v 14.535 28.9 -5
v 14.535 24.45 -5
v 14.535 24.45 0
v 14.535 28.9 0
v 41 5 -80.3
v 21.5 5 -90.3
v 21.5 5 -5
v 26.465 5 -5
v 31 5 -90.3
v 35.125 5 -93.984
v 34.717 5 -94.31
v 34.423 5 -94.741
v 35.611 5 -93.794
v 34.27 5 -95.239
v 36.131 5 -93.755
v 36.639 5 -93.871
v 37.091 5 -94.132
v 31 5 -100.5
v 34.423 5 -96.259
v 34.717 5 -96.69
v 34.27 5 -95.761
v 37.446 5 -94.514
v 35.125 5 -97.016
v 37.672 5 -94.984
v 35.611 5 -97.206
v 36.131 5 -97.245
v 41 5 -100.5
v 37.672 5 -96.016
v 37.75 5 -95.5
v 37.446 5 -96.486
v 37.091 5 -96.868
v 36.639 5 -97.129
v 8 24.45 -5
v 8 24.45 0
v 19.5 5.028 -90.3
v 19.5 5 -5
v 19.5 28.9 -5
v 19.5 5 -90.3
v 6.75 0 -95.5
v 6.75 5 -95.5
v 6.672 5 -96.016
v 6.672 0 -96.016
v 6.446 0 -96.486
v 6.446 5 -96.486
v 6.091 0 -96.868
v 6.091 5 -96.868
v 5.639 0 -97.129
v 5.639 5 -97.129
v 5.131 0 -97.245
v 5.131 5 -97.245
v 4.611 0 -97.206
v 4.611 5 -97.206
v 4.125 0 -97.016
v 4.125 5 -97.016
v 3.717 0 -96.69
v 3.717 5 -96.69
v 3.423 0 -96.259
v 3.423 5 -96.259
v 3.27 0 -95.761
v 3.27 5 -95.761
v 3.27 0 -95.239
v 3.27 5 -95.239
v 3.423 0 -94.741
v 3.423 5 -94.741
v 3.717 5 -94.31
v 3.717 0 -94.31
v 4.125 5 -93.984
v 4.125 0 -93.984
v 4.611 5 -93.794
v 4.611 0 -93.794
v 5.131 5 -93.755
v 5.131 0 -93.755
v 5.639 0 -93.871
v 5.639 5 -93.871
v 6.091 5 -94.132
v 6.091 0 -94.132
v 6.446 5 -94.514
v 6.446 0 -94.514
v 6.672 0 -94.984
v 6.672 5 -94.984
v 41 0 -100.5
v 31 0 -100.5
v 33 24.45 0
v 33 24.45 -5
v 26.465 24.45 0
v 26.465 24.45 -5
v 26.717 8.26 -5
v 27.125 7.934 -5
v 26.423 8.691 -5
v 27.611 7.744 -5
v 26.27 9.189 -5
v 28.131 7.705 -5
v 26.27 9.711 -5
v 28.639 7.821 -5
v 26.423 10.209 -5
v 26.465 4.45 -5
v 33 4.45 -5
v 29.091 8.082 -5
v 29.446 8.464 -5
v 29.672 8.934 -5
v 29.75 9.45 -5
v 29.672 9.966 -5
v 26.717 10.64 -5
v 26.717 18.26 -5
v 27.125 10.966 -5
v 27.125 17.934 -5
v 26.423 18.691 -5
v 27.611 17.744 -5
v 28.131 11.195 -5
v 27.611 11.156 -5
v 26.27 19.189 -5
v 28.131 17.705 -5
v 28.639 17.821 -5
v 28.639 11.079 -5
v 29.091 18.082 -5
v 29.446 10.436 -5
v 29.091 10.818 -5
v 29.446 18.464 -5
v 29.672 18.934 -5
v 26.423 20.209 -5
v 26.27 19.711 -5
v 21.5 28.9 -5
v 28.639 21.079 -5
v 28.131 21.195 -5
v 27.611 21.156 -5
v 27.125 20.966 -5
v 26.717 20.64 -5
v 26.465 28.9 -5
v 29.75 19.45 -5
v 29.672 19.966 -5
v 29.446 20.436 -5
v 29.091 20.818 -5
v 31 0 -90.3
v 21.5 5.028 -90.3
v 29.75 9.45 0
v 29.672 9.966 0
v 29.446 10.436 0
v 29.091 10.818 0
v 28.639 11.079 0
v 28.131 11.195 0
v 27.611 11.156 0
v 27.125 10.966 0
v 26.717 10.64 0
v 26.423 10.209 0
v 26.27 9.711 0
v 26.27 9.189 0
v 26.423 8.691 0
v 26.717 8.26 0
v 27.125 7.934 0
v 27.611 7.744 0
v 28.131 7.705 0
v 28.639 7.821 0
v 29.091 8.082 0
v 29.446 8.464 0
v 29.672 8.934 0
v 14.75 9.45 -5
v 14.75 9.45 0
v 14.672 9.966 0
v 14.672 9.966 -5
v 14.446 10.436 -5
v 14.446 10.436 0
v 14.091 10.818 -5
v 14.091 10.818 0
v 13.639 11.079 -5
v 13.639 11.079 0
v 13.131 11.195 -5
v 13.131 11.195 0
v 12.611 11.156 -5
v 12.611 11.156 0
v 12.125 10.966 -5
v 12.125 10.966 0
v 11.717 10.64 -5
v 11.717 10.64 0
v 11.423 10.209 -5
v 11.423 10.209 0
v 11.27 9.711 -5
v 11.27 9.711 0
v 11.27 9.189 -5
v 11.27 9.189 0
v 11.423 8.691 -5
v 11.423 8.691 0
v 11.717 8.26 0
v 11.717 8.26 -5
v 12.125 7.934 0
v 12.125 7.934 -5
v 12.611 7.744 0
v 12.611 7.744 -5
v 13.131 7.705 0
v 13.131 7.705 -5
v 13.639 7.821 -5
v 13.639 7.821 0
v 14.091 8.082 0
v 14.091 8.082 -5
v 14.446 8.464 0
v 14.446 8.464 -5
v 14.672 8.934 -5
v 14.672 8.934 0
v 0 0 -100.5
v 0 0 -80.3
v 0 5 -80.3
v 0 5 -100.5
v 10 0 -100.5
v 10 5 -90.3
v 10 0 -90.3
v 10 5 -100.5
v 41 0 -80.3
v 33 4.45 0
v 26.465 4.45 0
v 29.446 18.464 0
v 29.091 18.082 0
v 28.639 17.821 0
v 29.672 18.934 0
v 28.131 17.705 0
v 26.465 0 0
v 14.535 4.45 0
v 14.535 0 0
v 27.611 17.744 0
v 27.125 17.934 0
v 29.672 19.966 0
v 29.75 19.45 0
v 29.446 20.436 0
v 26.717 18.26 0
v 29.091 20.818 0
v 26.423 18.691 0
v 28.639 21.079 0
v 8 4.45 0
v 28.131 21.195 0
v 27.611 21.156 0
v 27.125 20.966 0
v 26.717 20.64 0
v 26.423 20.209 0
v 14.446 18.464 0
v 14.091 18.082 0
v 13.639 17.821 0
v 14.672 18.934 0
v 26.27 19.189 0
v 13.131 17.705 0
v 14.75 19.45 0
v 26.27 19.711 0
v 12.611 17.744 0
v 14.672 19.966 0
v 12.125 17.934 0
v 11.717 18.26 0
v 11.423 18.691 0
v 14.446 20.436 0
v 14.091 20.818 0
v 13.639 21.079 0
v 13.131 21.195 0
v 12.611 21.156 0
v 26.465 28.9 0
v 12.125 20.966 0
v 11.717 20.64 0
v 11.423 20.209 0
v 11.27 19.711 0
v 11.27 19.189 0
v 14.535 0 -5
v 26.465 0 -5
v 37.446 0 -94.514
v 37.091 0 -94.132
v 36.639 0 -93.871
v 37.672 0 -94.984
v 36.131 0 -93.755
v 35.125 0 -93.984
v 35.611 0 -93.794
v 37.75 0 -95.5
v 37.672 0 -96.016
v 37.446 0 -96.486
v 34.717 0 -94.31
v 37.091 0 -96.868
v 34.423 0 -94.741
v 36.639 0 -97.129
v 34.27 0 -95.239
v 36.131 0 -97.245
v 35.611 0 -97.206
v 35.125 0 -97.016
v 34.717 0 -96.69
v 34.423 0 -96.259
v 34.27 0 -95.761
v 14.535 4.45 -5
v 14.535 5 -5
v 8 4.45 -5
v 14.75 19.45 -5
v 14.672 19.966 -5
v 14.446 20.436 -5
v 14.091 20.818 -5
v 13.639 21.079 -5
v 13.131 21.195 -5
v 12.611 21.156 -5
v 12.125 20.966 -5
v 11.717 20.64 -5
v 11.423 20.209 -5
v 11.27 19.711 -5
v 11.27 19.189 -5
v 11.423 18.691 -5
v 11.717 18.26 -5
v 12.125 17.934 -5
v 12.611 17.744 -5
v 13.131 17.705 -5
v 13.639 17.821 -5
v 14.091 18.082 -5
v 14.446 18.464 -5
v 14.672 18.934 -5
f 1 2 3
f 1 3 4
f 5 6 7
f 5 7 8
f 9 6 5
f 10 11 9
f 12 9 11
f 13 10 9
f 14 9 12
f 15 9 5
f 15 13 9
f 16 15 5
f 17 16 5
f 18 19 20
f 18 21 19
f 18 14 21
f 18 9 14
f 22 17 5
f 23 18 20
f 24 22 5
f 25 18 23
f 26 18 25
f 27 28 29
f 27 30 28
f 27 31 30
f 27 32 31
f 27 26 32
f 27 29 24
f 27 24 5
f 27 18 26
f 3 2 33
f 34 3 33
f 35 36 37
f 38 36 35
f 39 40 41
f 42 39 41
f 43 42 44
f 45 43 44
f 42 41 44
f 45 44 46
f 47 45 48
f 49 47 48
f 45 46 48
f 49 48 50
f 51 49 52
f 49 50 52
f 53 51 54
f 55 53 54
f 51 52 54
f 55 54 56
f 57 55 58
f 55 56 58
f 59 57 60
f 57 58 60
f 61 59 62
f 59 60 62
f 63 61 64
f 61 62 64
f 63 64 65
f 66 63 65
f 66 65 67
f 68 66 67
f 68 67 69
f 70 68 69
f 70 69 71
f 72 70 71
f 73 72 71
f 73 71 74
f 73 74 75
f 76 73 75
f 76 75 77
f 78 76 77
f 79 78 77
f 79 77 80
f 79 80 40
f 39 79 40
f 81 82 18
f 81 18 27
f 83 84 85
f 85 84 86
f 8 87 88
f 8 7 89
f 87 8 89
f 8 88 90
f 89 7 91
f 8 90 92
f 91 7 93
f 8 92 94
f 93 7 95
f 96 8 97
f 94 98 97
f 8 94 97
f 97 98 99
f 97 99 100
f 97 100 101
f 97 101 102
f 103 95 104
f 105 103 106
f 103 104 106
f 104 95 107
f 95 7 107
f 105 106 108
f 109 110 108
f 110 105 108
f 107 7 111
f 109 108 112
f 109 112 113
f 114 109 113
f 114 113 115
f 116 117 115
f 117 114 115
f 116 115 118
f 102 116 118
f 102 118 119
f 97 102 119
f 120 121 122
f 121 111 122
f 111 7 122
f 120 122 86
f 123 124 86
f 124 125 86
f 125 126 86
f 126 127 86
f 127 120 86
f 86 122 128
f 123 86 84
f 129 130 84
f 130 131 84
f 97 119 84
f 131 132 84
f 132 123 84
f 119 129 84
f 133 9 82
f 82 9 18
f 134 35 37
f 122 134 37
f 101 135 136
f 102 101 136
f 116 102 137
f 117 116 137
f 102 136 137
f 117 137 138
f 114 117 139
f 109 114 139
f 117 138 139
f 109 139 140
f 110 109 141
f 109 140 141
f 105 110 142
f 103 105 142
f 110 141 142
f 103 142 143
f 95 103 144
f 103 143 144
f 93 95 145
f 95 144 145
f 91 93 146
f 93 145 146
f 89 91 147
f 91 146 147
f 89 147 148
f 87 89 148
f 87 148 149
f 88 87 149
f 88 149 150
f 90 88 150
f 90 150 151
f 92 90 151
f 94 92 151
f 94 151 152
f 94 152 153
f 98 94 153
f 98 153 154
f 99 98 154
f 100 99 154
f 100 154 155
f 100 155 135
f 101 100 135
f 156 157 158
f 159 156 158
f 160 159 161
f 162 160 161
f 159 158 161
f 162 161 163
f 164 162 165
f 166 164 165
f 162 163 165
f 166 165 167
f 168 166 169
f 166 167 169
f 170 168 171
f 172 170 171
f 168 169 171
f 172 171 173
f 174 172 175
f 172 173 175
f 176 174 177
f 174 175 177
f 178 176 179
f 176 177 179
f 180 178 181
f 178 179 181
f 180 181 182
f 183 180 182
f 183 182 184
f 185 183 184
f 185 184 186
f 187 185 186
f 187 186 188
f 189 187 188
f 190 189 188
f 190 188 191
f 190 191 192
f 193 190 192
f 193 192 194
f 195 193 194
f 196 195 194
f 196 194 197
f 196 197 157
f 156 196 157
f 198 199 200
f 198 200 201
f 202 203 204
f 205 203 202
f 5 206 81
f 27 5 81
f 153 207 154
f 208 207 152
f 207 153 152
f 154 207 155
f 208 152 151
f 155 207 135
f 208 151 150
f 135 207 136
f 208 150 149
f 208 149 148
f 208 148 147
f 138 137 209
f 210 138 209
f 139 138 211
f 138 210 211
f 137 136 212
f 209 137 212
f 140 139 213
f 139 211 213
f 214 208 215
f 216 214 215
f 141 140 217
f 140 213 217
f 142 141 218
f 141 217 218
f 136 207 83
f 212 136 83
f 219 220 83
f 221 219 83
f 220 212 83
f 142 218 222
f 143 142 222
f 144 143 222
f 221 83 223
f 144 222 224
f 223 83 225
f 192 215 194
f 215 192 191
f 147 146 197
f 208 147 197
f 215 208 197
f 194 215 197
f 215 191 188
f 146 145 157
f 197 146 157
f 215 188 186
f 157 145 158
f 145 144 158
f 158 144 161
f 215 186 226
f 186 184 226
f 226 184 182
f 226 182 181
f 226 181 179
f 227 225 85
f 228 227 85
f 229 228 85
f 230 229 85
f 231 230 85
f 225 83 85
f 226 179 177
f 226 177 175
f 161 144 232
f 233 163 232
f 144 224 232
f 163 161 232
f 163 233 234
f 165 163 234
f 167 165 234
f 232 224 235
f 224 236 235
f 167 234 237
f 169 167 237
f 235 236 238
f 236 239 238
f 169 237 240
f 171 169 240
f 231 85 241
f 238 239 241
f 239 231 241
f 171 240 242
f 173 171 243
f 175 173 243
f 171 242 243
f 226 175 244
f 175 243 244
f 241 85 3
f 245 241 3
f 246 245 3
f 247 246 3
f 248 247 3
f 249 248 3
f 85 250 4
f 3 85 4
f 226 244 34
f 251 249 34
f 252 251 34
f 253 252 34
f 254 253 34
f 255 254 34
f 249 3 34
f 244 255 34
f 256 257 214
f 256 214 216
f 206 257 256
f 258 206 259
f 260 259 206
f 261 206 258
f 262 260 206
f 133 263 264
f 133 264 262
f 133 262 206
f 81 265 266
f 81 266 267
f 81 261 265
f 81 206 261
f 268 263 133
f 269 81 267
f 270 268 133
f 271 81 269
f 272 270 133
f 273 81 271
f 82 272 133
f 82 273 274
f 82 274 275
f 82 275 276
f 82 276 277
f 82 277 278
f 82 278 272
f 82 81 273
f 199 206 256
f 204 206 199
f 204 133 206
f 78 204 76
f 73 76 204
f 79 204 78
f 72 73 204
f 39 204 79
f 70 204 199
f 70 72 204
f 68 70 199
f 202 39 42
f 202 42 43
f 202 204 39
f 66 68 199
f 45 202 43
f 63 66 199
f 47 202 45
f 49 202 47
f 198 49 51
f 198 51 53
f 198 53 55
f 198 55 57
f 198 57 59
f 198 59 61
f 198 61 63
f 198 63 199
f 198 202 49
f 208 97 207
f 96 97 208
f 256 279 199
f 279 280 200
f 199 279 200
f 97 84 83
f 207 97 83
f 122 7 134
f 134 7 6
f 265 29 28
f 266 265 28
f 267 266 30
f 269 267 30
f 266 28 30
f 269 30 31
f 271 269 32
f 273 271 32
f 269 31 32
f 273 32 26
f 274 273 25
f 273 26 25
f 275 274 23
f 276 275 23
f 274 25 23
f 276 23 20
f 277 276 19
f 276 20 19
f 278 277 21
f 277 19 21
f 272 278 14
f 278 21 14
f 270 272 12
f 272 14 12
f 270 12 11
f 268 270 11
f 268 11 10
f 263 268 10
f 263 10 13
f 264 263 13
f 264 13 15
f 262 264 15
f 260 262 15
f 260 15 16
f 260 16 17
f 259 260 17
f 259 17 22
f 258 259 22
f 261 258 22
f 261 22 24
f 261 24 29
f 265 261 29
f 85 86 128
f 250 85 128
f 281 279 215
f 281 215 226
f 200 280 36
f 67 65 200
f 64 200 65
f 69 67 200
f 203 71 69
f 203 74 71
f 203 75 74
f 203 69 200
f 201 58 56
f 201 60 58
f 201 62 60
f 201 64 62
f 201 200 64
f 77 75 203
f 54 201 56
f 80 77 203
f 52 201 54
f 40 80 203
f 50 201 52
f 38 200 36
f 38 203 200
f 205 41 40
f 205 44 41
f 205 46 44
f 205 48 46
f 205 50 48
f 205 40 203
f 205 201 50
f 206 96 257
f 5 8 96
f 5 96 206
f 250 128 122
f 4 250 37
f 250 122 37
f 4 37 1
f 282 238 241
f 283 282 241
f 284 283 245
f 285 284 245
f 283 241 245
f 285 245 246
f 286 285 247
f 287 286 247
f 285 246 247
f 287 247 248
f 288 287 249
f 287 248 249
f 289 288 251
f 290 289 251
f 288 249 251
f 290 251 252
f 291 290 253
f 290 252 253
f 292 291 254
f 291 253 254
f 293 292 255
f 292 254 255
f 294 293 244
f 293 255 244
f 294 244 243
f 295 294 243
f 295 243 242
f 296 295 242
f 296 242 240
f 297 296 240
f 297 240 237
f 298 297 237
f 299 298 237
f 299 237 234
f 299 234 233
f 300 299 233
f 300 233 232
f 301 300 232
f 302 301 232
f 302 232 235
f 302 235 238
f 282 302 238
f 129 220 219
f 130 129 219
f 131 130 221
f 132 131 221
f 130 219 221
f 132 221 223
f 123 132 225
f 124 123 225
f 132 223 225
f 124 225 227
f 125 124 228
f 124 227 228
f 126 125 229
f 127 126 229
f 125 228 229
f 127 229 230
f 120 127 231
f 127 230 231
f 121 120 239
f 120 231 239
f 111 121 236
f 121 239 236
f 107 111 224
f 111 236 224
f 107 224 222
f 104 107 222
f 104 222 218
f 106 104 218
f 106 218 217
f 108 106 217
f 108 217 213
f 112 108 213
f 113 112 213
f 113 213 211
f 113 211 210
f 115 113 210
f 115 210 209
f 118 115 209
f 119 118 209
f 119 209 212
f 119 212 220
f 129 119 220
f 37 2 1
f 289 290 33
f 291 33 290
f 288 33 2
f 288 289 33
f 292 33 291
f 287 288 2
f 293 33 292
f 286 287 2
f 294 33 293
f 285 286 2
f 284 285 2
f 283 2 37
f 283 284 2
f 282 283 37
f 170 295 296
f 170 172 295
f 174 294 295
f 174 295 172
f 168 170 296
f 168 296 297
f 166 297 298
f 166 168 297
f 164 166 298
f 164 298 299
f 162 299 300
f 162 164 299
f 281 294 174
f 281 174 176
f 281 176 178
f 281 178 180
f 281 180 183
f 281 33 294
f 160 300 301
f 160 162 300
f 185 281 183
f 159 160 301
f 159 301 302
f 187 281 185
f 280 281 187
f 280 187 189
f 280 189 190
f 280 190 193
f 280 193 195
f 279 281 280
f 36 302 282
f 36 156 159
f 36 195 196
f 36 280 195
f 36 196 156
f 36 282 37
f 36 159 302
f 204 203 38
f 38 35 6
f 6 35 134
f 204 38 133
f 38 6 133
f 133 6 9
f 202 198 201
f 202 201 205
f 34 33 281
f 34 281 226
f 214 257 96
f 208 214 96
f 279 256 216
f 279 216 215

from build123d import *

# Parameters (mm, degrees)
SKETCH1_W           = 41
SKETCH1_H           = 100.5
BOSS_EXTRUDE1_DEPTH = 5
SKETCH2_W           = 21
SKETCH2_H           = 10.2
CUT_EXTRUDE1_DEPTH  = 6
SKETCH9_R           = 1.75
CUT_EXTRUDE4_DEPTH  = 6
CUT_EXTRUDE5_DEPTH  = 6
BOSS_EXTRUDE4_DEPTH = 23.9
SKETCH16_W          = 2
SKETCH16_H          = 85.3
BOSS_EXTRUDE5_DEPTH = 23.9
CUT_EXTRUDE8_DEPTH  = 22.5
BOSS_EXTRUDE6_DEPTH = 28.9
SKETCH25_W          = 6.53486924
SKETCH25_H          = 4.45
CUT_EXTRUDE9_DEPTH  = 6
SKETCH26_R          = 1.75
CUT_EXTRUDE10_DEPTH = 101.5


with BuildPart() as part:
    # Sketch1 → Boss-Extrude1 (new body)
    with BuildSketch(Plane(origin=(0, 0, 0), x_dir=(1, 0, 0), z_dir=(0, 1, 0))):
        with Locations((20.5, 50.25)):
            Rectangle(SKETCH1_W, SKETCH1_H)
    extrude(amount=BOSS_EXTRUDE1_DEPTH)

    # Sketch2 → Cut-Extrude1 (cut, through all)
    with BuildSketch(Plane(origin=(0, 5, 0), x_dir=(1, 0, 0), z_dir=(0, 1, 0))):
        with Locations((20.5, 95.4)):
            Rectangle(SKETCH2_W, SKETCH2_H)
    extrude(amount=-CUT_EXTRUDE1_DEPTH, mode=Mode.SUBTRACT)

    # Sketch9 → Cut-Extrude4 (cut, through all)
    with BuildSketch(Plane(origin=(0, 5, 0), x_dir=(1, 0, 0), z_dir=(0, 1, 0))):
        with Locations((5, 95.5)):
            Circle(SKETCH9_R)
        with Locations((36, 95.5)):
            Circle(SKETCH9_R)
    extrude(amount=-CUT_EXTRUDE4_DEPTH, mode=Mode.SUBTRACT)

    # Sketch11 → Cut-Extrude5 (cut, through all)
    with BuildSketch(Plane(origin=(0, 5, 0), x_dir=(1, 0, 0), z_dir=(0, 1, 0))):
        Polygon((15.5, 0), (0, 80.3), (0, 0), align=None)
        Polygon((25.5, 0), (41, 80.3), (41, 0), align=None)
    extrude(amount=-CUT_EXTRUDE5_DEPTH, mode=Mode.SUBTRACT)

    # Sketch12 → Boss-Extrude4 (add)
    with BuildSketch(Plane(origin=(0, 5, 0), x_dir=(1, 0, 0), z_dir=(0, 1, 0))):
        Polygon((25.5, 0), (15.5, 0), (14.53486924, 5), (26.46513076, 5), align=None)
    extrude(amount=BOSS_EXTRUDE4_DEPTH)

    # Sketch16 → Boss-Extrude5 (add)
    with BuildSketch(Plane(origin=(0, 5, 0), x_dir=(1, 0, 0), z_dir=(0, 1, 0))):
        with Locations((20.5, 47.65)):
            Rectangle(SKETCH16_W, SKETCH16_H)
    extrude(amount=BOSS_EXTRUDE5_DEPTH)

    # Sketch17 → Cut-Extrude8 (cut, through all)
    with BuildSketch(Plane.ZY.offset(-19.5)):
        Polygon((-90.4, 5), (-5, 28.9), (-90.3, 28.9), align=None)
    extrude(amount=-CUT_EXTRUDE8_DEPTH, mode=Mode.SUBTRACT)

    # Sketch23 → Boss-Extrude6 (add)
    with BuildSketch(Plane(origin=(0, 28.9, 0), x_dir=(1, 0, 0), z_dir=(0, 1, 0))):
        Polygon((26.46513076, 5), (33, 5), (33, 0), (25.5, 0), align=None)
        Polygon((14.53486924, 5), (8, 5), (8, 0), (15.5, 0), align=None)
    extrude(amount=-BOSS_EXTRUDE6_DEPTH)

    # Sketch25 → Cut-Extrude9 (cut, through all)
    with BuildSketch(Plane(origin=(0, 0, -5), x_dir=(-1, 0, 0), z_dir=(0, 0, -1))):
        with Locations((-11.26743462, 2.225)):
            Rectangle(SKETCH25_W, SKETCH25_H)
        with Locations((-29.73256538, 2.225)):
            Rectangle(SKETCH25_W, SKETCH25_H)
        with Locations((-11.26743462, 26.675)):
            Rectangle(SKETCH25_W, SKETCH25_H)
        with Locations((-29.73256538, 26.675)):
            Rectangle(SKETCH25_W, SKETCH25_H)
    extrude(amount=-CUT_EXTRUDE9_DEPTH, mode=Mode.SUBTRACT)

    # Sketch26 → Cut-Extrude10 (cut, through all)
    with BuildSketch(Plane.XY):
        with Locations((13, 19.45)):
            Circle(SKETCH26_R)
        with Locations((28, 19.45)):
            Circle(SKETCH26_R)
        with Locations((13, 9.45)):
            Circle(SKETCH26_R)
        with Locations((28, 9.45)):
            Circle(SKETCH26_R)
    extrude(amount=-CUT_EXTRUDE10_DEPTH, mode=Mode.SUBTRACT)


solid = part.part
